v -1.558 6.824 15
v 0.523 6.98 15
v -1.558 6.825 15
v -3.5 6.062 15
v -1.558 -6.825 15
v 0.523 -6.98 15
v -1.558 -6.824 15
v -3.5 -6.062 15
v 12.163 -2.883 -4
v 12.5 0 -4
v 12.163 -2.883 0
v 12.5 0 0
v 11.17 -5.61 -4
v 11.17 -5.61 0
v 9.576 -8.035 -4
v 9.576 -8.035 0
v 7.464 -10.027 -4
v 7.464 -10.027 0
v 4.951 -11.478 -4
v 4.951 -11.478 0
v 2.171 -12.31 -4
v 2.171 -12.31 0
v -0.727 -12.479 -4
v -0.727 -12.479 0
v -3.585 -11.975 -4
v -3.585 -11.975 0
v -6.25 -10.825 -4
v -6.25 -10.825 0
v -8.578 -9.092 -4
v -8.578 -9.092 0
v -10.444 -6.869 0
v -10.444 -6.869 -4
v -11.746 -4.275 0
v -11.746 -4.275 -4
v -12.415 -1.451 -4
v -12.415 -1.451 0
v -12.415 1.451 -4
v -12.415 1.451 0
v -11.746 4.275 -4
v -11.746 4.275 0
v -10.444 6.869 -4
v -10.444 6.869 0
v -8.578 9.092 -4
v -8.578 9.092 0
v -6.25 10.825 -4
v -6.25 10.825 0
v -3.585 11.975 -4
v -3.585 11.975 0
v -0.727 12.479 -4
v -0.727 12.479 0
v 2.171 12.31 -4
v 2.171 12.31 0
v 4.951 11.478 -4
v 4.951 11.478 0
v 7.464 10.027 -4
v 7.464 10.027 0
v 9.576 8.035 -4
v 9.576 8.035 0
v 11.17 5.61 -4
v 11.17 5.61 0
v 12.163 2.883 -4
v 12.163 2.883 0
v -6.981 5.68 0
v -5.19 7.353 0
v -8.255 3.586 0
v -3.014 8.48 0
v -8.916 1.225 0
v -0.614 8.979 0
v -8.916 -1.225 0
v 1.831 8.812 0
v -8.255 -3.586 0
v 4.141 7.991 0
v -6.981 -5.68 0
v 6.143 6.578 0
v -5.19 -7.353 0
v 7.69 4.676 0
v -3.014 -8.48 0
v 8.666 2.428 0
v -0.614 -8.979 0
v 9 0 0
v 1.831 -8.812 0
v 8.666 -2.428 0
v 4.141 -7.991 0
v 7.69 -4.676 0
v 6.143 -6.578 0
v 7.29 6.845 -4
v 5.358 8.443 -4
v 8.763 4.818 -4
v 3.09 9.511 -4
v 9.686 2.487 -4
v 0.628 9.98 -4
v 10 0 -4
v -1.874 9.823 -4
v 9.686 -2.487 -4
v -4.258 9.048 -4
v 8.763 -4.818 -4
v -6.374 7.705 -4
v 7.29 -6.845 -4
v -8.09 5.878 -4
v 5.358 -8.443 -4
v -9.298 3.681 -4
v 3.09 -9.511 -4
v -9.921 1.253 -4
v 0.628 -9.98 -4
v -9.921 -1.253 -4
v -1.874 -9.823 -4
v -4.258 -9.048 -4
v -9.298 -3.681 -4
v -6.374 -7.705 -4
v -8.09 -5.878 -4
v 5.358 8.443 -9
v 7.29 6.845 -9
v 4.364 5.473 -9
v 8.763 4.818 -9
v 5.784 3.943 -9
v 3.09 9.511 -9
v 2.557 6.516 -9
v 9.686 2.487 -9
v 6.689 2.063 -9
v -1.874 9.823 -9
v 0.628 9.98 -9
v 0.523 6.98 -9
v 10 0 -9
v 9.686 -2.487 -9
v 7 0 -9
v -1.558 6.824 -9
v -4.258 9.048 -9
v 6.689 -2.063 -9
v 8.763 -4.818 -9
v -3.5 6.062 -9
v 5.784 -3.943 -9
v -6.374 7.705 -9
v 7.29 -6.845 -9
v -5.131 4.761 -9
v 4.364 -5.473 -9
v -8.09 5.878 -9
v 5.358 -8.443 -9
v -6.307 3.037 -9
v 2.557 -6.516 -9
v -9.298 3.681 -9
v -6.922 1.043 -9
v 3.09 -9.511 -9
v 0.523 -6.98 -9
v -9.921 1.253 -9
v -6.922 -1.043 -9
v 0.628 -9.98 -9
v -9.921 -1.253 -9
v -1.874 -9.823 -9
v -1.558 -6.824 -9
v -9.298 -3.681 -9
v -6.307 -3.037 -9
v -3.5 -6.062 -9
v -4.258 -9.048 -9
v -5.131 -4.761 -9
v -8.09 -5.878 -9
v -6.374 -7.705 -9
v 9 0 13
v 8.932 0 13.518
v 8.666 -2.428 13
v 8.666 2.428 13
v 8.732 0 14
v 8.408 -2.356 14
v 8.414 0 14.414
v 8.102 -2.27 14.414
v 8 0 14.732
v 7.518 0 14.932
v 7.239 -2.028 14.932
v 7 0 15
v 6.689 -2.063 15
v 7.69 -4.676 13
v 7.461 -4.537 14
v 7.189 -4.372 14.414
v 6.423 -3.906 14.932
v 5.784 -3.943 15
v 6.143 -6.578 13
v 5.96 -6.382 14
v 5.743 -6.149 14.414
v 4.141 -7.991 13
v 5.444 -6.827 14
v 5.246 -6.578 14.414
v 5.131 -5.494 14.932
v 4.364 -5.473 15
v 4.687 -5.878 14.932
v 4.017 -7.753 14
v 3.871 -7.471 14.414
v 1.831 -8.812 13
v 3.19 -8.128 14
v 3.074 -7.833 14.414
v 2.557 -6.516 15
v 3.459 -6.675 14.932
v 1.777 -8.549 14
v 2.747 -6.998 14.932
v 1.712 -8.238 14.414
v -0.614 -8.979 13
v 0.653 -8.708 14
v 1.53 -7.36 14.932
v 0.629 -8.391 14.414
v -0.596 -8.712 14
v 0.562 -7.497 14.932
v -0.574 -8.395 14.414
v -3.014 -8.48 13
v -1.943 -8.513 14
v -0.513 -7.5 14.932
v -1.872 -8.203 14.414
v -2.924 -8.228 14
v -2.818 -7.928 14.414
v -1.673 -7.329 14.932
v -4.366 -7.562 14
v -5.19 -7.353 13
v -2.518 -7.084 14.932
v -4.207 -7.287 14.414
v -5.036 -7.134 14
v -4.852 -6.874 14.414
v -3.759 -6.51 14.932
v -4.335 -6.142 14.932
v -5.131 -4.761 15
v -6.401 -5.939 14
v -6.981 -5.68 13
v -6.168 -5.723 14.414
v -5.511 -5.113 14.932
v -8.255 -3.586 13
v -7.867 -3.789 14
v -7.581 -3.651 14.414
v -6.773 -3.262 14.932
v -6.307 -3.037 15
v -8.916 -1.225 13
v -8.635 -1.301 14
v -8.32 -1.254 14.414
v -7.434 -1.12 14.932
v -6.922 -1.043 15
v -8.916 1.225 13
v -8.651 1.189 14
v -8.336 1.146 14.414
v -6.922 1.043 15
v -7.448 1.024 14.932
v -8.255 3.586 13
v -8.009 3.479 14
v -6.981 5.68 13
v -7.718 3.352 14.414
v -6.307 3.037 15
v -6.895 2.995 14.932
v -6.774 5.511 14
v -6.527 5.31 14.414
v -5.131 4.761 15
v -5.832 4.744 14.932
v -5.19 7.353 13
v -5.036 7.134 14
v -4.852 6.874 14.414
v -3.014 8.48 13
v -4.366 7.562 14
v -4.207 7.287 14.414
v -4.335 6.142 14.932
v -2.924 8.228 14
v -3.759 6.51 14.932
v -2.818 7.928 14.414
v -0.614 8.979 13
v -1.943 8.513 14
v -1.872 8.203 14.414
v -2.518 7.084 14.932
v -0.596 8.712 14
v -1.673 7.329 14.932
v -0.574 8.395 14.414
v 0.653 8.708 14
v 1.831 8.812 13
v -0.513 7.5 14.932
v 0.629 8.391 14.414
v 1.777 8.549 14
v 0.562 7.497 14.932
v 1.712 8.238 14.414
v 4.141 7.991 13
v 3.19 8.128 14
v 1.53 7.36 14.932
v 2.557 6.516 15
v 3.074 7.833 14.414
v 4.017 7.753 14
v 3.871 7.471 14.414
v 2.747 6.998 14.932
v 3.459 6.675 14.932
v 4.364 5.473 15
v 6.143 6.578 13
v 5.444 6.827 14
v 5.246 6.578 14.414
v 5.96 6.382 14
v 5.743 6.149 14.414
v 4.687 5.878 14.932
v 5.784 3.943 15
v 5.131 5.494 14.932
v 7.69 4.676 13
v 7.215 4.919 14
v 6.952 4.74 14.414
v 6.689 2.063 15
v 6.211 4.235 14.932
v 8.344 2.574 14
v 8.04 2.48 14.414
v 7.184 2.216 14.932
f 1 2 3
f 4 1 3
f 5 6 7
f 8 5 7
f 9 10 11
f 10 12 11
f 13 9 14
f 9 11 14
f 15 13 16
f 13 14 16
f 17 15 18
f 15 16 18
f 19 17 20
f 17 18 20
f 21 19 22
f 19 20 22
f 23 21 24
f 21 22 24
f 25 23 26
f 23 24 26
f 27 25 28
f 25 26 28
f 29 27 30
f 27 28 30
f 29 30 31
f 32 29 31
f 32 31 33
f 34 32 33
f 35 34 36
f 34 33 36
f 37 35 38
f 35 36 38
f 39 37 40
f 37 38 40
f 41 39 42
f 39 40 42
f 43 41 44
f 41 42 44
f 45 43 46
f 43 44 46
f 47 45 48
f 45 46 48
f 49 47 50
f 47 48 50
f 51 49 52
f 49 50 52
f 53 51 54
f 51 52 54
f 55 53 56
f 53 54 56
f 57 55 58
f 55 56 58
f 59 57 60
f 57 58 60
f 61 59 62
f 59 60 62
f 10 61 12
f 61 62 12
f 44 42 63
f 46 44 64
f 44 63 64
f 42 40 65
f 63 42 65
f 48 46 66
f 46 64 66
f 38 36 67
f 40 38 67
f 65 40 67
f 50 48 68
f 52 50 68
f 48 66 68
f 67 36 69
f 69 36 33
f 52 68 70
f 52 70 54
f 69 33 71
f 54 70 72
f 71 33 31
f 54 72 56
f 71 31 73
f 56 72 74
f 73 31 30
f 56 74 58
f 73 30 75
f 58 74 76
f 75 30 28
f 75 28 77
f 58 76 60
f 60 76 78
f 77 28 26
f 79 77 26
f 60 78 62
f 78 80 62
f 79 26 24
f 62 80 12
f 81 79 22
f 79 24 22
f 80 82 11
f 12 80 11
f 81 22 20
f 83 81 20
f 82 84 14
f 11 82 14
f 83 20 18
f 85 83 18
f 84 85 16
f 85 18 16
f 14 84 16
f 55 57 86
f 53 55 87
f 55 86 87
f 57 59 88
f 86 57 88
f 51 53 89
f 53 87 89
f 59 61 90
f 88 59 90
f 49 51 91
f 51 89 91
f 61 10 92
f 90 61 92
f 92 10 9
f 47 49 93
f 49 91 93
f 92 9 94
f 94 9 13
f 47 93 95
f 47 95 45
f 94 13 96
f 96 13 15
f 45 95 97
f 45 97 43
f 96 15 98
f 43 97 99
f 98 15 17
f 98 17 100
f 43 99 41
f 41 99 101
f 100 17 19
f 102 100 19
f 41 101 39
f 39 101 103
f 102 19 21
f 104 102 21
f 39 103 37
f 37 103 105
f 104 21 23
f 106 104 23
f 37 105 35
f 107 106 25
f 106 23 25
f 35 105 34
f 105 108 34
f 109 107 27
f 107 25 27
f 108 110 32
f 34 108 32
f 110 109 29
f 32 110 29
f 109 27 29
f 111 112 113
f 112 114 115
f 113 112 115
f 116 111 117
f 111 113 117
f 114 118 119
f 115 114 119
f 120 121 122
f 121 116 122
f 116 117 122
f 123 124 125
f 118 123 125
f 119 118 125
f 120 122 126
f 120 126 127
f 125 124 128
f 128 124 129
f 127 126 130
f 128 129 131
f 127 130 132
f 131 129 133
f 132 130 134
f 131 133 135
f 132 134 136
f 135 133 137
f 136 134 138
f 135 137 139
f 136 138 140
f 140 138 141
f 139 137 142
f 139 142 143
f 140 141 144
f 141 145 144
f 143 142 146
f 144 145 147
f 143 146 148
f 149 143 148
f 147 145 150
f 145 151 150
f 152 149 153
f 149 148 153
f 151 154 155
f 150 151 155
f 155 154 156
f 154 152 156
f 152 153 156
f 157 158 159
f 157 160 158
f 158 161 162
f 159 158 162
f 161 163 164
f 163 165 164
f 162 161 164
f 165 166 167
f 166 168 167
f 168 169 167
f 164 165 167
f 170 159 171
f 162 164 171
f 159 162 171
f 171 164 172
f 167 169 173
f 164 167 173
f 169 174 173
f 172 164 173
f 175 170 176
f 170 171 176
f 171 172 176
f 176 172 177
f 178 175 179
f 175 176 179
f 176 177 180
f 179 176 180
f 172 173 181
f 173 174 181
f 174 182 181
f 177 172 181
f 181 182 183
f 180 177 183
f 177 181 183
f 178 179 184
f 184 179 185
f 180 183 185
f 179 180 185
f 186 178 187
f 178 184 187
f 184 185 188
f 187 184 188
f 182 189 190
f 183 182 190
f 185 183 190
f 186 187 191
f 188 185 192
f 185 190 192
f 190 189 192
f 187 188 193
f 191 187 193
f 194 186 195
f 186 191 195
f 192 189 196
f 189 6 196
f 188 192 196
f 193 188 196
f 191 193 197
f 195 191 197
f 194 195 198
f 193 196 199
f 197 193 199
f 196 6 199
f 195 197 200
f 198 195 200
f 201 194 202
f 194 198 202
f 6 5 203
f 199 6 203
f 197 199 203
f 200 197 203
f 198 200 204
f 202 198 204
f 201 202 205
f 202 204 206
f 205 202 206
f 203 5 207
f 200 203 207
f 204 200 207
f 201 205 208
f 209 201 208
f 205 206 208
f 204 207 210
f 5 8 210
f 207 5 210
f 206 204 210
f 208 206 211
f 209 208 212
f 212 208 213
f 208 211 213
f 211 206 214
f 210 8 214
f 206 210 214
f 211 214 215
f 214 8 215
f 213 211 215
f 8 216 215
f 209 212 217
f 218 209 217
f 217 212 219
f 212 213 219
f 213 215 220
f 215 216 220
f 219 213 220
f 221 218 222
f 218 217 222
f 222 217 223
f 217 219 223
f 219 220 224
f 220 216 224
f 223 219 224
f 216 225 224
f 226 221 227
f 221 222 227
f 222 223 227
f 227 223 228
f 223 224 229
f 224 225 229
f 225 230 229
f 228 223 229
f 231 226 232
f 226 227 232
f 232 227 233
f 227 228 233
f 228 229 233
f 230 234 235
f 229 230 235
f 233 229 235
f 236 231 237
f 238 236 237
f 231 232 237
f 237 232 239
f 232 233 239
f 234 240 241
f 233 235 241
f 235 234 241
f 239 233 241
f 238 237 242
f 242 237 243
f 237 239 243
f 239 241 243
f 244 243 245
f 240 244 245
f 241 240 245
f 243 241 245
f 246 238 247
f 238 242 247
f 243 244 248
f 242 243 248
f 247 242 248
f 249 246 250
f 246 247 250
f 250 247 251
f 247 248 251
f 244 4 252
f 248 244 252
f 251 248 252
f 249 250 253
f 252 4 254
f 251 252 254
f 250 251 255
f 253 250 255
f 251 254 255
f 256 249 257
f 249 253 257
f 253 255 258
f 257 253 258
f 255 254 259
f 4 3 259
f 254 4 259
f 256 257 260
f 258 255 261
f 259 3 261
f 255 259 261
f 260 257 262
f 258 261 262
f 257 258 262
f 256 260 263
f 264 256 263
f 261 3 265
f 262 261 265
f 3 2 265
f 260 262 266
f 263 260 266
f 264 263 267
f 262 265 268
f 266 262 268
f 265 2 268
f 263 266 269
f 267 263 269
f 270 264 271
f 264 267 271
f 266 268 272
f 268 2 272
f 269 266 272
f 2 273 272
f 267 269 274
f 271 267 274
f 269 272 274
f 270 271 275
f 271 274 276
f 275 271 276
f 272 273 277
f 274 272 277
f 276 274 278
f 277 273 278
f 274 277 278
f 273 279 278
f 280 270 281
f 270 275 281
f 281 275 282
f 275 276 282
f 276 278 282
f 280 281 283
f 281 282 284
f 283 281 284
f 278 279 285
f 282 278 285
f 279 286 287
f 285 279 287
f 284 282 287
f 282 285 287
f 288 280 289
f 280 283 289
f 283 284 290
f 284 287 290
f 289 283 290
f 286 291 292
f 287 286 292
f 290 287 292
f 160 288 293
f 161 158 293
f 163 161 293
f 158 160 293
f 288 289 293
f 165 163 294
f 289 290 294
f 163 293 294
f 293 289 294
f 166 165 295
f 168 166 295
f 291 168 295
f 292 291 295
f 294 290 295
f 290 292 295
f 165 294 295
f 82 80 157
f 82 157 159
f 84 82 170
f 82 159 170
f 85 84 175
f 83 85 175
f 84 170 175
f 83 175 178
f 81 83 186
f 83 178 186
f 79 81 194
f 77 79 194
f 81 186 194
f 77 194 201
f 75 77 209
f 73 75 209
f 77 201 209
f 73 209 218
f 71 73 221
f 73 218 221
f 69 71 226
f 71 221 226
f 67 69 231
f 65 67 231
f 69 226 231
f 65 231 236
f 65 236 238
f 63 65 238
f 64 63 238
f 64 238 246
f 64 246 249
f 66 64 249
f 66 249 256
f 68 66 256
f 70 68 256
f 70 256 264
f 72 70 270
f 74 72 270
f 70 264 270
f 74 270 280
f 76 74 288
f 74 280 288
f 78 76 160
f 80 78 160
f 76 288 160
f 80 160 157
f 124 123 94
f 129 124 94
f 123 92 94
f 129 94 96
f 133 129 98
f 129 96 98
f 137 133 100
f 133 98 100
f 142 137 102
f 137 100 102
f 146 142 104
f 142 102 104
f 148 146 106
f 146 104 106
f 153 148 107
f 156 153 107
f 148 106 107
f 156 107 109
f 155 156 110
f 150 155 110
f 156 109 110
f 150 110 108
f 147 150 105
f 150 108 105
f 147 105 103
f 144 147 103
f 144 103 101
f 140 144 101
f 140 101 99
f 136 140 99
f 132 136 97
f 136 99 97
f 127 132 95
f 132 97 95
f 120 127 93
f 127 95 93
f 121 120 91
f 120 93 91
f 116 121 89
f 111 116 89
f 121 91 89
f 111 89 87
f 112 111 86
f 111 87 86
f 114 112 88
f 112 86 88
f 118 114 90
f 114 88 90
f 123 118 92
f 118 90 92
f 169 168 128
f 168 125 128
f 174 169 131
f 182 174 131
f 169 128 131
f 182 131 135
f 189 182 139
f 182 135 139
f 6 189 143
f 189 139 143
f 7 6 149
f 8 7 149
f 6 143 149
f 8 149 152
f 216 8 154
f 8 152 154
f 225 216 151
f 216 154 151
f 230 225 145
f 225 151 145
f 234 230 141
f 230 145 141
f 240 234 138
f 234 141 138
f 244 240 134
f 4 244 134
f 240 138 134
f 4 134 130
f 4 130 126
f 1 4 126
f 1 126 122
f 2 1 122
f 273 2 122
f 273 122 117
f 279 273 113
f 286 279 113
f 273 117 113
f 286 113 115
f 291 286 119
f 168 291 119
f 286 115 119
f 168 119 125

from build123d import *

# Parameters (mm, degrees)
F0_W   = 2
F0_H   = 15
F0_W_2 = 3
F0_H_2 = 5
F2_R   = 1.99999


# Not quite as in the source:
# - a fillet or chamfer is up to 0.001 mm smaller than in the source, because OpenCascade refuses the exact size


with BuildPart() as f1:
    # F0 (on Front) → F1 (revolve)
    with BuildSketch(Plane.XZ):
        with Locations((8, 7.5)):
            Rectangle(F0_W, F0_H)
        Polygon((9, 0), (7, 0), (7, -4), (10, -4), (12.5, -4), (12.5, 0), align=None)
        with Locations((8.5, -6.5)):
            Rectangle(F0_W_2, F0_H_2)
    revolve(axis=Axis((0, 0, 7.5), (0, 0, -1)))

    # F2 (radius 2 in the source; OpenCascade refuses exactly that, so slightly less here)
    f2_edges = [f1.edges().sort_by_distance(p)[0] for p in [
        (-9, 0, 15),
    ]]
    fillet(f2_edges, radius=F2_R)


solid = f1.part
